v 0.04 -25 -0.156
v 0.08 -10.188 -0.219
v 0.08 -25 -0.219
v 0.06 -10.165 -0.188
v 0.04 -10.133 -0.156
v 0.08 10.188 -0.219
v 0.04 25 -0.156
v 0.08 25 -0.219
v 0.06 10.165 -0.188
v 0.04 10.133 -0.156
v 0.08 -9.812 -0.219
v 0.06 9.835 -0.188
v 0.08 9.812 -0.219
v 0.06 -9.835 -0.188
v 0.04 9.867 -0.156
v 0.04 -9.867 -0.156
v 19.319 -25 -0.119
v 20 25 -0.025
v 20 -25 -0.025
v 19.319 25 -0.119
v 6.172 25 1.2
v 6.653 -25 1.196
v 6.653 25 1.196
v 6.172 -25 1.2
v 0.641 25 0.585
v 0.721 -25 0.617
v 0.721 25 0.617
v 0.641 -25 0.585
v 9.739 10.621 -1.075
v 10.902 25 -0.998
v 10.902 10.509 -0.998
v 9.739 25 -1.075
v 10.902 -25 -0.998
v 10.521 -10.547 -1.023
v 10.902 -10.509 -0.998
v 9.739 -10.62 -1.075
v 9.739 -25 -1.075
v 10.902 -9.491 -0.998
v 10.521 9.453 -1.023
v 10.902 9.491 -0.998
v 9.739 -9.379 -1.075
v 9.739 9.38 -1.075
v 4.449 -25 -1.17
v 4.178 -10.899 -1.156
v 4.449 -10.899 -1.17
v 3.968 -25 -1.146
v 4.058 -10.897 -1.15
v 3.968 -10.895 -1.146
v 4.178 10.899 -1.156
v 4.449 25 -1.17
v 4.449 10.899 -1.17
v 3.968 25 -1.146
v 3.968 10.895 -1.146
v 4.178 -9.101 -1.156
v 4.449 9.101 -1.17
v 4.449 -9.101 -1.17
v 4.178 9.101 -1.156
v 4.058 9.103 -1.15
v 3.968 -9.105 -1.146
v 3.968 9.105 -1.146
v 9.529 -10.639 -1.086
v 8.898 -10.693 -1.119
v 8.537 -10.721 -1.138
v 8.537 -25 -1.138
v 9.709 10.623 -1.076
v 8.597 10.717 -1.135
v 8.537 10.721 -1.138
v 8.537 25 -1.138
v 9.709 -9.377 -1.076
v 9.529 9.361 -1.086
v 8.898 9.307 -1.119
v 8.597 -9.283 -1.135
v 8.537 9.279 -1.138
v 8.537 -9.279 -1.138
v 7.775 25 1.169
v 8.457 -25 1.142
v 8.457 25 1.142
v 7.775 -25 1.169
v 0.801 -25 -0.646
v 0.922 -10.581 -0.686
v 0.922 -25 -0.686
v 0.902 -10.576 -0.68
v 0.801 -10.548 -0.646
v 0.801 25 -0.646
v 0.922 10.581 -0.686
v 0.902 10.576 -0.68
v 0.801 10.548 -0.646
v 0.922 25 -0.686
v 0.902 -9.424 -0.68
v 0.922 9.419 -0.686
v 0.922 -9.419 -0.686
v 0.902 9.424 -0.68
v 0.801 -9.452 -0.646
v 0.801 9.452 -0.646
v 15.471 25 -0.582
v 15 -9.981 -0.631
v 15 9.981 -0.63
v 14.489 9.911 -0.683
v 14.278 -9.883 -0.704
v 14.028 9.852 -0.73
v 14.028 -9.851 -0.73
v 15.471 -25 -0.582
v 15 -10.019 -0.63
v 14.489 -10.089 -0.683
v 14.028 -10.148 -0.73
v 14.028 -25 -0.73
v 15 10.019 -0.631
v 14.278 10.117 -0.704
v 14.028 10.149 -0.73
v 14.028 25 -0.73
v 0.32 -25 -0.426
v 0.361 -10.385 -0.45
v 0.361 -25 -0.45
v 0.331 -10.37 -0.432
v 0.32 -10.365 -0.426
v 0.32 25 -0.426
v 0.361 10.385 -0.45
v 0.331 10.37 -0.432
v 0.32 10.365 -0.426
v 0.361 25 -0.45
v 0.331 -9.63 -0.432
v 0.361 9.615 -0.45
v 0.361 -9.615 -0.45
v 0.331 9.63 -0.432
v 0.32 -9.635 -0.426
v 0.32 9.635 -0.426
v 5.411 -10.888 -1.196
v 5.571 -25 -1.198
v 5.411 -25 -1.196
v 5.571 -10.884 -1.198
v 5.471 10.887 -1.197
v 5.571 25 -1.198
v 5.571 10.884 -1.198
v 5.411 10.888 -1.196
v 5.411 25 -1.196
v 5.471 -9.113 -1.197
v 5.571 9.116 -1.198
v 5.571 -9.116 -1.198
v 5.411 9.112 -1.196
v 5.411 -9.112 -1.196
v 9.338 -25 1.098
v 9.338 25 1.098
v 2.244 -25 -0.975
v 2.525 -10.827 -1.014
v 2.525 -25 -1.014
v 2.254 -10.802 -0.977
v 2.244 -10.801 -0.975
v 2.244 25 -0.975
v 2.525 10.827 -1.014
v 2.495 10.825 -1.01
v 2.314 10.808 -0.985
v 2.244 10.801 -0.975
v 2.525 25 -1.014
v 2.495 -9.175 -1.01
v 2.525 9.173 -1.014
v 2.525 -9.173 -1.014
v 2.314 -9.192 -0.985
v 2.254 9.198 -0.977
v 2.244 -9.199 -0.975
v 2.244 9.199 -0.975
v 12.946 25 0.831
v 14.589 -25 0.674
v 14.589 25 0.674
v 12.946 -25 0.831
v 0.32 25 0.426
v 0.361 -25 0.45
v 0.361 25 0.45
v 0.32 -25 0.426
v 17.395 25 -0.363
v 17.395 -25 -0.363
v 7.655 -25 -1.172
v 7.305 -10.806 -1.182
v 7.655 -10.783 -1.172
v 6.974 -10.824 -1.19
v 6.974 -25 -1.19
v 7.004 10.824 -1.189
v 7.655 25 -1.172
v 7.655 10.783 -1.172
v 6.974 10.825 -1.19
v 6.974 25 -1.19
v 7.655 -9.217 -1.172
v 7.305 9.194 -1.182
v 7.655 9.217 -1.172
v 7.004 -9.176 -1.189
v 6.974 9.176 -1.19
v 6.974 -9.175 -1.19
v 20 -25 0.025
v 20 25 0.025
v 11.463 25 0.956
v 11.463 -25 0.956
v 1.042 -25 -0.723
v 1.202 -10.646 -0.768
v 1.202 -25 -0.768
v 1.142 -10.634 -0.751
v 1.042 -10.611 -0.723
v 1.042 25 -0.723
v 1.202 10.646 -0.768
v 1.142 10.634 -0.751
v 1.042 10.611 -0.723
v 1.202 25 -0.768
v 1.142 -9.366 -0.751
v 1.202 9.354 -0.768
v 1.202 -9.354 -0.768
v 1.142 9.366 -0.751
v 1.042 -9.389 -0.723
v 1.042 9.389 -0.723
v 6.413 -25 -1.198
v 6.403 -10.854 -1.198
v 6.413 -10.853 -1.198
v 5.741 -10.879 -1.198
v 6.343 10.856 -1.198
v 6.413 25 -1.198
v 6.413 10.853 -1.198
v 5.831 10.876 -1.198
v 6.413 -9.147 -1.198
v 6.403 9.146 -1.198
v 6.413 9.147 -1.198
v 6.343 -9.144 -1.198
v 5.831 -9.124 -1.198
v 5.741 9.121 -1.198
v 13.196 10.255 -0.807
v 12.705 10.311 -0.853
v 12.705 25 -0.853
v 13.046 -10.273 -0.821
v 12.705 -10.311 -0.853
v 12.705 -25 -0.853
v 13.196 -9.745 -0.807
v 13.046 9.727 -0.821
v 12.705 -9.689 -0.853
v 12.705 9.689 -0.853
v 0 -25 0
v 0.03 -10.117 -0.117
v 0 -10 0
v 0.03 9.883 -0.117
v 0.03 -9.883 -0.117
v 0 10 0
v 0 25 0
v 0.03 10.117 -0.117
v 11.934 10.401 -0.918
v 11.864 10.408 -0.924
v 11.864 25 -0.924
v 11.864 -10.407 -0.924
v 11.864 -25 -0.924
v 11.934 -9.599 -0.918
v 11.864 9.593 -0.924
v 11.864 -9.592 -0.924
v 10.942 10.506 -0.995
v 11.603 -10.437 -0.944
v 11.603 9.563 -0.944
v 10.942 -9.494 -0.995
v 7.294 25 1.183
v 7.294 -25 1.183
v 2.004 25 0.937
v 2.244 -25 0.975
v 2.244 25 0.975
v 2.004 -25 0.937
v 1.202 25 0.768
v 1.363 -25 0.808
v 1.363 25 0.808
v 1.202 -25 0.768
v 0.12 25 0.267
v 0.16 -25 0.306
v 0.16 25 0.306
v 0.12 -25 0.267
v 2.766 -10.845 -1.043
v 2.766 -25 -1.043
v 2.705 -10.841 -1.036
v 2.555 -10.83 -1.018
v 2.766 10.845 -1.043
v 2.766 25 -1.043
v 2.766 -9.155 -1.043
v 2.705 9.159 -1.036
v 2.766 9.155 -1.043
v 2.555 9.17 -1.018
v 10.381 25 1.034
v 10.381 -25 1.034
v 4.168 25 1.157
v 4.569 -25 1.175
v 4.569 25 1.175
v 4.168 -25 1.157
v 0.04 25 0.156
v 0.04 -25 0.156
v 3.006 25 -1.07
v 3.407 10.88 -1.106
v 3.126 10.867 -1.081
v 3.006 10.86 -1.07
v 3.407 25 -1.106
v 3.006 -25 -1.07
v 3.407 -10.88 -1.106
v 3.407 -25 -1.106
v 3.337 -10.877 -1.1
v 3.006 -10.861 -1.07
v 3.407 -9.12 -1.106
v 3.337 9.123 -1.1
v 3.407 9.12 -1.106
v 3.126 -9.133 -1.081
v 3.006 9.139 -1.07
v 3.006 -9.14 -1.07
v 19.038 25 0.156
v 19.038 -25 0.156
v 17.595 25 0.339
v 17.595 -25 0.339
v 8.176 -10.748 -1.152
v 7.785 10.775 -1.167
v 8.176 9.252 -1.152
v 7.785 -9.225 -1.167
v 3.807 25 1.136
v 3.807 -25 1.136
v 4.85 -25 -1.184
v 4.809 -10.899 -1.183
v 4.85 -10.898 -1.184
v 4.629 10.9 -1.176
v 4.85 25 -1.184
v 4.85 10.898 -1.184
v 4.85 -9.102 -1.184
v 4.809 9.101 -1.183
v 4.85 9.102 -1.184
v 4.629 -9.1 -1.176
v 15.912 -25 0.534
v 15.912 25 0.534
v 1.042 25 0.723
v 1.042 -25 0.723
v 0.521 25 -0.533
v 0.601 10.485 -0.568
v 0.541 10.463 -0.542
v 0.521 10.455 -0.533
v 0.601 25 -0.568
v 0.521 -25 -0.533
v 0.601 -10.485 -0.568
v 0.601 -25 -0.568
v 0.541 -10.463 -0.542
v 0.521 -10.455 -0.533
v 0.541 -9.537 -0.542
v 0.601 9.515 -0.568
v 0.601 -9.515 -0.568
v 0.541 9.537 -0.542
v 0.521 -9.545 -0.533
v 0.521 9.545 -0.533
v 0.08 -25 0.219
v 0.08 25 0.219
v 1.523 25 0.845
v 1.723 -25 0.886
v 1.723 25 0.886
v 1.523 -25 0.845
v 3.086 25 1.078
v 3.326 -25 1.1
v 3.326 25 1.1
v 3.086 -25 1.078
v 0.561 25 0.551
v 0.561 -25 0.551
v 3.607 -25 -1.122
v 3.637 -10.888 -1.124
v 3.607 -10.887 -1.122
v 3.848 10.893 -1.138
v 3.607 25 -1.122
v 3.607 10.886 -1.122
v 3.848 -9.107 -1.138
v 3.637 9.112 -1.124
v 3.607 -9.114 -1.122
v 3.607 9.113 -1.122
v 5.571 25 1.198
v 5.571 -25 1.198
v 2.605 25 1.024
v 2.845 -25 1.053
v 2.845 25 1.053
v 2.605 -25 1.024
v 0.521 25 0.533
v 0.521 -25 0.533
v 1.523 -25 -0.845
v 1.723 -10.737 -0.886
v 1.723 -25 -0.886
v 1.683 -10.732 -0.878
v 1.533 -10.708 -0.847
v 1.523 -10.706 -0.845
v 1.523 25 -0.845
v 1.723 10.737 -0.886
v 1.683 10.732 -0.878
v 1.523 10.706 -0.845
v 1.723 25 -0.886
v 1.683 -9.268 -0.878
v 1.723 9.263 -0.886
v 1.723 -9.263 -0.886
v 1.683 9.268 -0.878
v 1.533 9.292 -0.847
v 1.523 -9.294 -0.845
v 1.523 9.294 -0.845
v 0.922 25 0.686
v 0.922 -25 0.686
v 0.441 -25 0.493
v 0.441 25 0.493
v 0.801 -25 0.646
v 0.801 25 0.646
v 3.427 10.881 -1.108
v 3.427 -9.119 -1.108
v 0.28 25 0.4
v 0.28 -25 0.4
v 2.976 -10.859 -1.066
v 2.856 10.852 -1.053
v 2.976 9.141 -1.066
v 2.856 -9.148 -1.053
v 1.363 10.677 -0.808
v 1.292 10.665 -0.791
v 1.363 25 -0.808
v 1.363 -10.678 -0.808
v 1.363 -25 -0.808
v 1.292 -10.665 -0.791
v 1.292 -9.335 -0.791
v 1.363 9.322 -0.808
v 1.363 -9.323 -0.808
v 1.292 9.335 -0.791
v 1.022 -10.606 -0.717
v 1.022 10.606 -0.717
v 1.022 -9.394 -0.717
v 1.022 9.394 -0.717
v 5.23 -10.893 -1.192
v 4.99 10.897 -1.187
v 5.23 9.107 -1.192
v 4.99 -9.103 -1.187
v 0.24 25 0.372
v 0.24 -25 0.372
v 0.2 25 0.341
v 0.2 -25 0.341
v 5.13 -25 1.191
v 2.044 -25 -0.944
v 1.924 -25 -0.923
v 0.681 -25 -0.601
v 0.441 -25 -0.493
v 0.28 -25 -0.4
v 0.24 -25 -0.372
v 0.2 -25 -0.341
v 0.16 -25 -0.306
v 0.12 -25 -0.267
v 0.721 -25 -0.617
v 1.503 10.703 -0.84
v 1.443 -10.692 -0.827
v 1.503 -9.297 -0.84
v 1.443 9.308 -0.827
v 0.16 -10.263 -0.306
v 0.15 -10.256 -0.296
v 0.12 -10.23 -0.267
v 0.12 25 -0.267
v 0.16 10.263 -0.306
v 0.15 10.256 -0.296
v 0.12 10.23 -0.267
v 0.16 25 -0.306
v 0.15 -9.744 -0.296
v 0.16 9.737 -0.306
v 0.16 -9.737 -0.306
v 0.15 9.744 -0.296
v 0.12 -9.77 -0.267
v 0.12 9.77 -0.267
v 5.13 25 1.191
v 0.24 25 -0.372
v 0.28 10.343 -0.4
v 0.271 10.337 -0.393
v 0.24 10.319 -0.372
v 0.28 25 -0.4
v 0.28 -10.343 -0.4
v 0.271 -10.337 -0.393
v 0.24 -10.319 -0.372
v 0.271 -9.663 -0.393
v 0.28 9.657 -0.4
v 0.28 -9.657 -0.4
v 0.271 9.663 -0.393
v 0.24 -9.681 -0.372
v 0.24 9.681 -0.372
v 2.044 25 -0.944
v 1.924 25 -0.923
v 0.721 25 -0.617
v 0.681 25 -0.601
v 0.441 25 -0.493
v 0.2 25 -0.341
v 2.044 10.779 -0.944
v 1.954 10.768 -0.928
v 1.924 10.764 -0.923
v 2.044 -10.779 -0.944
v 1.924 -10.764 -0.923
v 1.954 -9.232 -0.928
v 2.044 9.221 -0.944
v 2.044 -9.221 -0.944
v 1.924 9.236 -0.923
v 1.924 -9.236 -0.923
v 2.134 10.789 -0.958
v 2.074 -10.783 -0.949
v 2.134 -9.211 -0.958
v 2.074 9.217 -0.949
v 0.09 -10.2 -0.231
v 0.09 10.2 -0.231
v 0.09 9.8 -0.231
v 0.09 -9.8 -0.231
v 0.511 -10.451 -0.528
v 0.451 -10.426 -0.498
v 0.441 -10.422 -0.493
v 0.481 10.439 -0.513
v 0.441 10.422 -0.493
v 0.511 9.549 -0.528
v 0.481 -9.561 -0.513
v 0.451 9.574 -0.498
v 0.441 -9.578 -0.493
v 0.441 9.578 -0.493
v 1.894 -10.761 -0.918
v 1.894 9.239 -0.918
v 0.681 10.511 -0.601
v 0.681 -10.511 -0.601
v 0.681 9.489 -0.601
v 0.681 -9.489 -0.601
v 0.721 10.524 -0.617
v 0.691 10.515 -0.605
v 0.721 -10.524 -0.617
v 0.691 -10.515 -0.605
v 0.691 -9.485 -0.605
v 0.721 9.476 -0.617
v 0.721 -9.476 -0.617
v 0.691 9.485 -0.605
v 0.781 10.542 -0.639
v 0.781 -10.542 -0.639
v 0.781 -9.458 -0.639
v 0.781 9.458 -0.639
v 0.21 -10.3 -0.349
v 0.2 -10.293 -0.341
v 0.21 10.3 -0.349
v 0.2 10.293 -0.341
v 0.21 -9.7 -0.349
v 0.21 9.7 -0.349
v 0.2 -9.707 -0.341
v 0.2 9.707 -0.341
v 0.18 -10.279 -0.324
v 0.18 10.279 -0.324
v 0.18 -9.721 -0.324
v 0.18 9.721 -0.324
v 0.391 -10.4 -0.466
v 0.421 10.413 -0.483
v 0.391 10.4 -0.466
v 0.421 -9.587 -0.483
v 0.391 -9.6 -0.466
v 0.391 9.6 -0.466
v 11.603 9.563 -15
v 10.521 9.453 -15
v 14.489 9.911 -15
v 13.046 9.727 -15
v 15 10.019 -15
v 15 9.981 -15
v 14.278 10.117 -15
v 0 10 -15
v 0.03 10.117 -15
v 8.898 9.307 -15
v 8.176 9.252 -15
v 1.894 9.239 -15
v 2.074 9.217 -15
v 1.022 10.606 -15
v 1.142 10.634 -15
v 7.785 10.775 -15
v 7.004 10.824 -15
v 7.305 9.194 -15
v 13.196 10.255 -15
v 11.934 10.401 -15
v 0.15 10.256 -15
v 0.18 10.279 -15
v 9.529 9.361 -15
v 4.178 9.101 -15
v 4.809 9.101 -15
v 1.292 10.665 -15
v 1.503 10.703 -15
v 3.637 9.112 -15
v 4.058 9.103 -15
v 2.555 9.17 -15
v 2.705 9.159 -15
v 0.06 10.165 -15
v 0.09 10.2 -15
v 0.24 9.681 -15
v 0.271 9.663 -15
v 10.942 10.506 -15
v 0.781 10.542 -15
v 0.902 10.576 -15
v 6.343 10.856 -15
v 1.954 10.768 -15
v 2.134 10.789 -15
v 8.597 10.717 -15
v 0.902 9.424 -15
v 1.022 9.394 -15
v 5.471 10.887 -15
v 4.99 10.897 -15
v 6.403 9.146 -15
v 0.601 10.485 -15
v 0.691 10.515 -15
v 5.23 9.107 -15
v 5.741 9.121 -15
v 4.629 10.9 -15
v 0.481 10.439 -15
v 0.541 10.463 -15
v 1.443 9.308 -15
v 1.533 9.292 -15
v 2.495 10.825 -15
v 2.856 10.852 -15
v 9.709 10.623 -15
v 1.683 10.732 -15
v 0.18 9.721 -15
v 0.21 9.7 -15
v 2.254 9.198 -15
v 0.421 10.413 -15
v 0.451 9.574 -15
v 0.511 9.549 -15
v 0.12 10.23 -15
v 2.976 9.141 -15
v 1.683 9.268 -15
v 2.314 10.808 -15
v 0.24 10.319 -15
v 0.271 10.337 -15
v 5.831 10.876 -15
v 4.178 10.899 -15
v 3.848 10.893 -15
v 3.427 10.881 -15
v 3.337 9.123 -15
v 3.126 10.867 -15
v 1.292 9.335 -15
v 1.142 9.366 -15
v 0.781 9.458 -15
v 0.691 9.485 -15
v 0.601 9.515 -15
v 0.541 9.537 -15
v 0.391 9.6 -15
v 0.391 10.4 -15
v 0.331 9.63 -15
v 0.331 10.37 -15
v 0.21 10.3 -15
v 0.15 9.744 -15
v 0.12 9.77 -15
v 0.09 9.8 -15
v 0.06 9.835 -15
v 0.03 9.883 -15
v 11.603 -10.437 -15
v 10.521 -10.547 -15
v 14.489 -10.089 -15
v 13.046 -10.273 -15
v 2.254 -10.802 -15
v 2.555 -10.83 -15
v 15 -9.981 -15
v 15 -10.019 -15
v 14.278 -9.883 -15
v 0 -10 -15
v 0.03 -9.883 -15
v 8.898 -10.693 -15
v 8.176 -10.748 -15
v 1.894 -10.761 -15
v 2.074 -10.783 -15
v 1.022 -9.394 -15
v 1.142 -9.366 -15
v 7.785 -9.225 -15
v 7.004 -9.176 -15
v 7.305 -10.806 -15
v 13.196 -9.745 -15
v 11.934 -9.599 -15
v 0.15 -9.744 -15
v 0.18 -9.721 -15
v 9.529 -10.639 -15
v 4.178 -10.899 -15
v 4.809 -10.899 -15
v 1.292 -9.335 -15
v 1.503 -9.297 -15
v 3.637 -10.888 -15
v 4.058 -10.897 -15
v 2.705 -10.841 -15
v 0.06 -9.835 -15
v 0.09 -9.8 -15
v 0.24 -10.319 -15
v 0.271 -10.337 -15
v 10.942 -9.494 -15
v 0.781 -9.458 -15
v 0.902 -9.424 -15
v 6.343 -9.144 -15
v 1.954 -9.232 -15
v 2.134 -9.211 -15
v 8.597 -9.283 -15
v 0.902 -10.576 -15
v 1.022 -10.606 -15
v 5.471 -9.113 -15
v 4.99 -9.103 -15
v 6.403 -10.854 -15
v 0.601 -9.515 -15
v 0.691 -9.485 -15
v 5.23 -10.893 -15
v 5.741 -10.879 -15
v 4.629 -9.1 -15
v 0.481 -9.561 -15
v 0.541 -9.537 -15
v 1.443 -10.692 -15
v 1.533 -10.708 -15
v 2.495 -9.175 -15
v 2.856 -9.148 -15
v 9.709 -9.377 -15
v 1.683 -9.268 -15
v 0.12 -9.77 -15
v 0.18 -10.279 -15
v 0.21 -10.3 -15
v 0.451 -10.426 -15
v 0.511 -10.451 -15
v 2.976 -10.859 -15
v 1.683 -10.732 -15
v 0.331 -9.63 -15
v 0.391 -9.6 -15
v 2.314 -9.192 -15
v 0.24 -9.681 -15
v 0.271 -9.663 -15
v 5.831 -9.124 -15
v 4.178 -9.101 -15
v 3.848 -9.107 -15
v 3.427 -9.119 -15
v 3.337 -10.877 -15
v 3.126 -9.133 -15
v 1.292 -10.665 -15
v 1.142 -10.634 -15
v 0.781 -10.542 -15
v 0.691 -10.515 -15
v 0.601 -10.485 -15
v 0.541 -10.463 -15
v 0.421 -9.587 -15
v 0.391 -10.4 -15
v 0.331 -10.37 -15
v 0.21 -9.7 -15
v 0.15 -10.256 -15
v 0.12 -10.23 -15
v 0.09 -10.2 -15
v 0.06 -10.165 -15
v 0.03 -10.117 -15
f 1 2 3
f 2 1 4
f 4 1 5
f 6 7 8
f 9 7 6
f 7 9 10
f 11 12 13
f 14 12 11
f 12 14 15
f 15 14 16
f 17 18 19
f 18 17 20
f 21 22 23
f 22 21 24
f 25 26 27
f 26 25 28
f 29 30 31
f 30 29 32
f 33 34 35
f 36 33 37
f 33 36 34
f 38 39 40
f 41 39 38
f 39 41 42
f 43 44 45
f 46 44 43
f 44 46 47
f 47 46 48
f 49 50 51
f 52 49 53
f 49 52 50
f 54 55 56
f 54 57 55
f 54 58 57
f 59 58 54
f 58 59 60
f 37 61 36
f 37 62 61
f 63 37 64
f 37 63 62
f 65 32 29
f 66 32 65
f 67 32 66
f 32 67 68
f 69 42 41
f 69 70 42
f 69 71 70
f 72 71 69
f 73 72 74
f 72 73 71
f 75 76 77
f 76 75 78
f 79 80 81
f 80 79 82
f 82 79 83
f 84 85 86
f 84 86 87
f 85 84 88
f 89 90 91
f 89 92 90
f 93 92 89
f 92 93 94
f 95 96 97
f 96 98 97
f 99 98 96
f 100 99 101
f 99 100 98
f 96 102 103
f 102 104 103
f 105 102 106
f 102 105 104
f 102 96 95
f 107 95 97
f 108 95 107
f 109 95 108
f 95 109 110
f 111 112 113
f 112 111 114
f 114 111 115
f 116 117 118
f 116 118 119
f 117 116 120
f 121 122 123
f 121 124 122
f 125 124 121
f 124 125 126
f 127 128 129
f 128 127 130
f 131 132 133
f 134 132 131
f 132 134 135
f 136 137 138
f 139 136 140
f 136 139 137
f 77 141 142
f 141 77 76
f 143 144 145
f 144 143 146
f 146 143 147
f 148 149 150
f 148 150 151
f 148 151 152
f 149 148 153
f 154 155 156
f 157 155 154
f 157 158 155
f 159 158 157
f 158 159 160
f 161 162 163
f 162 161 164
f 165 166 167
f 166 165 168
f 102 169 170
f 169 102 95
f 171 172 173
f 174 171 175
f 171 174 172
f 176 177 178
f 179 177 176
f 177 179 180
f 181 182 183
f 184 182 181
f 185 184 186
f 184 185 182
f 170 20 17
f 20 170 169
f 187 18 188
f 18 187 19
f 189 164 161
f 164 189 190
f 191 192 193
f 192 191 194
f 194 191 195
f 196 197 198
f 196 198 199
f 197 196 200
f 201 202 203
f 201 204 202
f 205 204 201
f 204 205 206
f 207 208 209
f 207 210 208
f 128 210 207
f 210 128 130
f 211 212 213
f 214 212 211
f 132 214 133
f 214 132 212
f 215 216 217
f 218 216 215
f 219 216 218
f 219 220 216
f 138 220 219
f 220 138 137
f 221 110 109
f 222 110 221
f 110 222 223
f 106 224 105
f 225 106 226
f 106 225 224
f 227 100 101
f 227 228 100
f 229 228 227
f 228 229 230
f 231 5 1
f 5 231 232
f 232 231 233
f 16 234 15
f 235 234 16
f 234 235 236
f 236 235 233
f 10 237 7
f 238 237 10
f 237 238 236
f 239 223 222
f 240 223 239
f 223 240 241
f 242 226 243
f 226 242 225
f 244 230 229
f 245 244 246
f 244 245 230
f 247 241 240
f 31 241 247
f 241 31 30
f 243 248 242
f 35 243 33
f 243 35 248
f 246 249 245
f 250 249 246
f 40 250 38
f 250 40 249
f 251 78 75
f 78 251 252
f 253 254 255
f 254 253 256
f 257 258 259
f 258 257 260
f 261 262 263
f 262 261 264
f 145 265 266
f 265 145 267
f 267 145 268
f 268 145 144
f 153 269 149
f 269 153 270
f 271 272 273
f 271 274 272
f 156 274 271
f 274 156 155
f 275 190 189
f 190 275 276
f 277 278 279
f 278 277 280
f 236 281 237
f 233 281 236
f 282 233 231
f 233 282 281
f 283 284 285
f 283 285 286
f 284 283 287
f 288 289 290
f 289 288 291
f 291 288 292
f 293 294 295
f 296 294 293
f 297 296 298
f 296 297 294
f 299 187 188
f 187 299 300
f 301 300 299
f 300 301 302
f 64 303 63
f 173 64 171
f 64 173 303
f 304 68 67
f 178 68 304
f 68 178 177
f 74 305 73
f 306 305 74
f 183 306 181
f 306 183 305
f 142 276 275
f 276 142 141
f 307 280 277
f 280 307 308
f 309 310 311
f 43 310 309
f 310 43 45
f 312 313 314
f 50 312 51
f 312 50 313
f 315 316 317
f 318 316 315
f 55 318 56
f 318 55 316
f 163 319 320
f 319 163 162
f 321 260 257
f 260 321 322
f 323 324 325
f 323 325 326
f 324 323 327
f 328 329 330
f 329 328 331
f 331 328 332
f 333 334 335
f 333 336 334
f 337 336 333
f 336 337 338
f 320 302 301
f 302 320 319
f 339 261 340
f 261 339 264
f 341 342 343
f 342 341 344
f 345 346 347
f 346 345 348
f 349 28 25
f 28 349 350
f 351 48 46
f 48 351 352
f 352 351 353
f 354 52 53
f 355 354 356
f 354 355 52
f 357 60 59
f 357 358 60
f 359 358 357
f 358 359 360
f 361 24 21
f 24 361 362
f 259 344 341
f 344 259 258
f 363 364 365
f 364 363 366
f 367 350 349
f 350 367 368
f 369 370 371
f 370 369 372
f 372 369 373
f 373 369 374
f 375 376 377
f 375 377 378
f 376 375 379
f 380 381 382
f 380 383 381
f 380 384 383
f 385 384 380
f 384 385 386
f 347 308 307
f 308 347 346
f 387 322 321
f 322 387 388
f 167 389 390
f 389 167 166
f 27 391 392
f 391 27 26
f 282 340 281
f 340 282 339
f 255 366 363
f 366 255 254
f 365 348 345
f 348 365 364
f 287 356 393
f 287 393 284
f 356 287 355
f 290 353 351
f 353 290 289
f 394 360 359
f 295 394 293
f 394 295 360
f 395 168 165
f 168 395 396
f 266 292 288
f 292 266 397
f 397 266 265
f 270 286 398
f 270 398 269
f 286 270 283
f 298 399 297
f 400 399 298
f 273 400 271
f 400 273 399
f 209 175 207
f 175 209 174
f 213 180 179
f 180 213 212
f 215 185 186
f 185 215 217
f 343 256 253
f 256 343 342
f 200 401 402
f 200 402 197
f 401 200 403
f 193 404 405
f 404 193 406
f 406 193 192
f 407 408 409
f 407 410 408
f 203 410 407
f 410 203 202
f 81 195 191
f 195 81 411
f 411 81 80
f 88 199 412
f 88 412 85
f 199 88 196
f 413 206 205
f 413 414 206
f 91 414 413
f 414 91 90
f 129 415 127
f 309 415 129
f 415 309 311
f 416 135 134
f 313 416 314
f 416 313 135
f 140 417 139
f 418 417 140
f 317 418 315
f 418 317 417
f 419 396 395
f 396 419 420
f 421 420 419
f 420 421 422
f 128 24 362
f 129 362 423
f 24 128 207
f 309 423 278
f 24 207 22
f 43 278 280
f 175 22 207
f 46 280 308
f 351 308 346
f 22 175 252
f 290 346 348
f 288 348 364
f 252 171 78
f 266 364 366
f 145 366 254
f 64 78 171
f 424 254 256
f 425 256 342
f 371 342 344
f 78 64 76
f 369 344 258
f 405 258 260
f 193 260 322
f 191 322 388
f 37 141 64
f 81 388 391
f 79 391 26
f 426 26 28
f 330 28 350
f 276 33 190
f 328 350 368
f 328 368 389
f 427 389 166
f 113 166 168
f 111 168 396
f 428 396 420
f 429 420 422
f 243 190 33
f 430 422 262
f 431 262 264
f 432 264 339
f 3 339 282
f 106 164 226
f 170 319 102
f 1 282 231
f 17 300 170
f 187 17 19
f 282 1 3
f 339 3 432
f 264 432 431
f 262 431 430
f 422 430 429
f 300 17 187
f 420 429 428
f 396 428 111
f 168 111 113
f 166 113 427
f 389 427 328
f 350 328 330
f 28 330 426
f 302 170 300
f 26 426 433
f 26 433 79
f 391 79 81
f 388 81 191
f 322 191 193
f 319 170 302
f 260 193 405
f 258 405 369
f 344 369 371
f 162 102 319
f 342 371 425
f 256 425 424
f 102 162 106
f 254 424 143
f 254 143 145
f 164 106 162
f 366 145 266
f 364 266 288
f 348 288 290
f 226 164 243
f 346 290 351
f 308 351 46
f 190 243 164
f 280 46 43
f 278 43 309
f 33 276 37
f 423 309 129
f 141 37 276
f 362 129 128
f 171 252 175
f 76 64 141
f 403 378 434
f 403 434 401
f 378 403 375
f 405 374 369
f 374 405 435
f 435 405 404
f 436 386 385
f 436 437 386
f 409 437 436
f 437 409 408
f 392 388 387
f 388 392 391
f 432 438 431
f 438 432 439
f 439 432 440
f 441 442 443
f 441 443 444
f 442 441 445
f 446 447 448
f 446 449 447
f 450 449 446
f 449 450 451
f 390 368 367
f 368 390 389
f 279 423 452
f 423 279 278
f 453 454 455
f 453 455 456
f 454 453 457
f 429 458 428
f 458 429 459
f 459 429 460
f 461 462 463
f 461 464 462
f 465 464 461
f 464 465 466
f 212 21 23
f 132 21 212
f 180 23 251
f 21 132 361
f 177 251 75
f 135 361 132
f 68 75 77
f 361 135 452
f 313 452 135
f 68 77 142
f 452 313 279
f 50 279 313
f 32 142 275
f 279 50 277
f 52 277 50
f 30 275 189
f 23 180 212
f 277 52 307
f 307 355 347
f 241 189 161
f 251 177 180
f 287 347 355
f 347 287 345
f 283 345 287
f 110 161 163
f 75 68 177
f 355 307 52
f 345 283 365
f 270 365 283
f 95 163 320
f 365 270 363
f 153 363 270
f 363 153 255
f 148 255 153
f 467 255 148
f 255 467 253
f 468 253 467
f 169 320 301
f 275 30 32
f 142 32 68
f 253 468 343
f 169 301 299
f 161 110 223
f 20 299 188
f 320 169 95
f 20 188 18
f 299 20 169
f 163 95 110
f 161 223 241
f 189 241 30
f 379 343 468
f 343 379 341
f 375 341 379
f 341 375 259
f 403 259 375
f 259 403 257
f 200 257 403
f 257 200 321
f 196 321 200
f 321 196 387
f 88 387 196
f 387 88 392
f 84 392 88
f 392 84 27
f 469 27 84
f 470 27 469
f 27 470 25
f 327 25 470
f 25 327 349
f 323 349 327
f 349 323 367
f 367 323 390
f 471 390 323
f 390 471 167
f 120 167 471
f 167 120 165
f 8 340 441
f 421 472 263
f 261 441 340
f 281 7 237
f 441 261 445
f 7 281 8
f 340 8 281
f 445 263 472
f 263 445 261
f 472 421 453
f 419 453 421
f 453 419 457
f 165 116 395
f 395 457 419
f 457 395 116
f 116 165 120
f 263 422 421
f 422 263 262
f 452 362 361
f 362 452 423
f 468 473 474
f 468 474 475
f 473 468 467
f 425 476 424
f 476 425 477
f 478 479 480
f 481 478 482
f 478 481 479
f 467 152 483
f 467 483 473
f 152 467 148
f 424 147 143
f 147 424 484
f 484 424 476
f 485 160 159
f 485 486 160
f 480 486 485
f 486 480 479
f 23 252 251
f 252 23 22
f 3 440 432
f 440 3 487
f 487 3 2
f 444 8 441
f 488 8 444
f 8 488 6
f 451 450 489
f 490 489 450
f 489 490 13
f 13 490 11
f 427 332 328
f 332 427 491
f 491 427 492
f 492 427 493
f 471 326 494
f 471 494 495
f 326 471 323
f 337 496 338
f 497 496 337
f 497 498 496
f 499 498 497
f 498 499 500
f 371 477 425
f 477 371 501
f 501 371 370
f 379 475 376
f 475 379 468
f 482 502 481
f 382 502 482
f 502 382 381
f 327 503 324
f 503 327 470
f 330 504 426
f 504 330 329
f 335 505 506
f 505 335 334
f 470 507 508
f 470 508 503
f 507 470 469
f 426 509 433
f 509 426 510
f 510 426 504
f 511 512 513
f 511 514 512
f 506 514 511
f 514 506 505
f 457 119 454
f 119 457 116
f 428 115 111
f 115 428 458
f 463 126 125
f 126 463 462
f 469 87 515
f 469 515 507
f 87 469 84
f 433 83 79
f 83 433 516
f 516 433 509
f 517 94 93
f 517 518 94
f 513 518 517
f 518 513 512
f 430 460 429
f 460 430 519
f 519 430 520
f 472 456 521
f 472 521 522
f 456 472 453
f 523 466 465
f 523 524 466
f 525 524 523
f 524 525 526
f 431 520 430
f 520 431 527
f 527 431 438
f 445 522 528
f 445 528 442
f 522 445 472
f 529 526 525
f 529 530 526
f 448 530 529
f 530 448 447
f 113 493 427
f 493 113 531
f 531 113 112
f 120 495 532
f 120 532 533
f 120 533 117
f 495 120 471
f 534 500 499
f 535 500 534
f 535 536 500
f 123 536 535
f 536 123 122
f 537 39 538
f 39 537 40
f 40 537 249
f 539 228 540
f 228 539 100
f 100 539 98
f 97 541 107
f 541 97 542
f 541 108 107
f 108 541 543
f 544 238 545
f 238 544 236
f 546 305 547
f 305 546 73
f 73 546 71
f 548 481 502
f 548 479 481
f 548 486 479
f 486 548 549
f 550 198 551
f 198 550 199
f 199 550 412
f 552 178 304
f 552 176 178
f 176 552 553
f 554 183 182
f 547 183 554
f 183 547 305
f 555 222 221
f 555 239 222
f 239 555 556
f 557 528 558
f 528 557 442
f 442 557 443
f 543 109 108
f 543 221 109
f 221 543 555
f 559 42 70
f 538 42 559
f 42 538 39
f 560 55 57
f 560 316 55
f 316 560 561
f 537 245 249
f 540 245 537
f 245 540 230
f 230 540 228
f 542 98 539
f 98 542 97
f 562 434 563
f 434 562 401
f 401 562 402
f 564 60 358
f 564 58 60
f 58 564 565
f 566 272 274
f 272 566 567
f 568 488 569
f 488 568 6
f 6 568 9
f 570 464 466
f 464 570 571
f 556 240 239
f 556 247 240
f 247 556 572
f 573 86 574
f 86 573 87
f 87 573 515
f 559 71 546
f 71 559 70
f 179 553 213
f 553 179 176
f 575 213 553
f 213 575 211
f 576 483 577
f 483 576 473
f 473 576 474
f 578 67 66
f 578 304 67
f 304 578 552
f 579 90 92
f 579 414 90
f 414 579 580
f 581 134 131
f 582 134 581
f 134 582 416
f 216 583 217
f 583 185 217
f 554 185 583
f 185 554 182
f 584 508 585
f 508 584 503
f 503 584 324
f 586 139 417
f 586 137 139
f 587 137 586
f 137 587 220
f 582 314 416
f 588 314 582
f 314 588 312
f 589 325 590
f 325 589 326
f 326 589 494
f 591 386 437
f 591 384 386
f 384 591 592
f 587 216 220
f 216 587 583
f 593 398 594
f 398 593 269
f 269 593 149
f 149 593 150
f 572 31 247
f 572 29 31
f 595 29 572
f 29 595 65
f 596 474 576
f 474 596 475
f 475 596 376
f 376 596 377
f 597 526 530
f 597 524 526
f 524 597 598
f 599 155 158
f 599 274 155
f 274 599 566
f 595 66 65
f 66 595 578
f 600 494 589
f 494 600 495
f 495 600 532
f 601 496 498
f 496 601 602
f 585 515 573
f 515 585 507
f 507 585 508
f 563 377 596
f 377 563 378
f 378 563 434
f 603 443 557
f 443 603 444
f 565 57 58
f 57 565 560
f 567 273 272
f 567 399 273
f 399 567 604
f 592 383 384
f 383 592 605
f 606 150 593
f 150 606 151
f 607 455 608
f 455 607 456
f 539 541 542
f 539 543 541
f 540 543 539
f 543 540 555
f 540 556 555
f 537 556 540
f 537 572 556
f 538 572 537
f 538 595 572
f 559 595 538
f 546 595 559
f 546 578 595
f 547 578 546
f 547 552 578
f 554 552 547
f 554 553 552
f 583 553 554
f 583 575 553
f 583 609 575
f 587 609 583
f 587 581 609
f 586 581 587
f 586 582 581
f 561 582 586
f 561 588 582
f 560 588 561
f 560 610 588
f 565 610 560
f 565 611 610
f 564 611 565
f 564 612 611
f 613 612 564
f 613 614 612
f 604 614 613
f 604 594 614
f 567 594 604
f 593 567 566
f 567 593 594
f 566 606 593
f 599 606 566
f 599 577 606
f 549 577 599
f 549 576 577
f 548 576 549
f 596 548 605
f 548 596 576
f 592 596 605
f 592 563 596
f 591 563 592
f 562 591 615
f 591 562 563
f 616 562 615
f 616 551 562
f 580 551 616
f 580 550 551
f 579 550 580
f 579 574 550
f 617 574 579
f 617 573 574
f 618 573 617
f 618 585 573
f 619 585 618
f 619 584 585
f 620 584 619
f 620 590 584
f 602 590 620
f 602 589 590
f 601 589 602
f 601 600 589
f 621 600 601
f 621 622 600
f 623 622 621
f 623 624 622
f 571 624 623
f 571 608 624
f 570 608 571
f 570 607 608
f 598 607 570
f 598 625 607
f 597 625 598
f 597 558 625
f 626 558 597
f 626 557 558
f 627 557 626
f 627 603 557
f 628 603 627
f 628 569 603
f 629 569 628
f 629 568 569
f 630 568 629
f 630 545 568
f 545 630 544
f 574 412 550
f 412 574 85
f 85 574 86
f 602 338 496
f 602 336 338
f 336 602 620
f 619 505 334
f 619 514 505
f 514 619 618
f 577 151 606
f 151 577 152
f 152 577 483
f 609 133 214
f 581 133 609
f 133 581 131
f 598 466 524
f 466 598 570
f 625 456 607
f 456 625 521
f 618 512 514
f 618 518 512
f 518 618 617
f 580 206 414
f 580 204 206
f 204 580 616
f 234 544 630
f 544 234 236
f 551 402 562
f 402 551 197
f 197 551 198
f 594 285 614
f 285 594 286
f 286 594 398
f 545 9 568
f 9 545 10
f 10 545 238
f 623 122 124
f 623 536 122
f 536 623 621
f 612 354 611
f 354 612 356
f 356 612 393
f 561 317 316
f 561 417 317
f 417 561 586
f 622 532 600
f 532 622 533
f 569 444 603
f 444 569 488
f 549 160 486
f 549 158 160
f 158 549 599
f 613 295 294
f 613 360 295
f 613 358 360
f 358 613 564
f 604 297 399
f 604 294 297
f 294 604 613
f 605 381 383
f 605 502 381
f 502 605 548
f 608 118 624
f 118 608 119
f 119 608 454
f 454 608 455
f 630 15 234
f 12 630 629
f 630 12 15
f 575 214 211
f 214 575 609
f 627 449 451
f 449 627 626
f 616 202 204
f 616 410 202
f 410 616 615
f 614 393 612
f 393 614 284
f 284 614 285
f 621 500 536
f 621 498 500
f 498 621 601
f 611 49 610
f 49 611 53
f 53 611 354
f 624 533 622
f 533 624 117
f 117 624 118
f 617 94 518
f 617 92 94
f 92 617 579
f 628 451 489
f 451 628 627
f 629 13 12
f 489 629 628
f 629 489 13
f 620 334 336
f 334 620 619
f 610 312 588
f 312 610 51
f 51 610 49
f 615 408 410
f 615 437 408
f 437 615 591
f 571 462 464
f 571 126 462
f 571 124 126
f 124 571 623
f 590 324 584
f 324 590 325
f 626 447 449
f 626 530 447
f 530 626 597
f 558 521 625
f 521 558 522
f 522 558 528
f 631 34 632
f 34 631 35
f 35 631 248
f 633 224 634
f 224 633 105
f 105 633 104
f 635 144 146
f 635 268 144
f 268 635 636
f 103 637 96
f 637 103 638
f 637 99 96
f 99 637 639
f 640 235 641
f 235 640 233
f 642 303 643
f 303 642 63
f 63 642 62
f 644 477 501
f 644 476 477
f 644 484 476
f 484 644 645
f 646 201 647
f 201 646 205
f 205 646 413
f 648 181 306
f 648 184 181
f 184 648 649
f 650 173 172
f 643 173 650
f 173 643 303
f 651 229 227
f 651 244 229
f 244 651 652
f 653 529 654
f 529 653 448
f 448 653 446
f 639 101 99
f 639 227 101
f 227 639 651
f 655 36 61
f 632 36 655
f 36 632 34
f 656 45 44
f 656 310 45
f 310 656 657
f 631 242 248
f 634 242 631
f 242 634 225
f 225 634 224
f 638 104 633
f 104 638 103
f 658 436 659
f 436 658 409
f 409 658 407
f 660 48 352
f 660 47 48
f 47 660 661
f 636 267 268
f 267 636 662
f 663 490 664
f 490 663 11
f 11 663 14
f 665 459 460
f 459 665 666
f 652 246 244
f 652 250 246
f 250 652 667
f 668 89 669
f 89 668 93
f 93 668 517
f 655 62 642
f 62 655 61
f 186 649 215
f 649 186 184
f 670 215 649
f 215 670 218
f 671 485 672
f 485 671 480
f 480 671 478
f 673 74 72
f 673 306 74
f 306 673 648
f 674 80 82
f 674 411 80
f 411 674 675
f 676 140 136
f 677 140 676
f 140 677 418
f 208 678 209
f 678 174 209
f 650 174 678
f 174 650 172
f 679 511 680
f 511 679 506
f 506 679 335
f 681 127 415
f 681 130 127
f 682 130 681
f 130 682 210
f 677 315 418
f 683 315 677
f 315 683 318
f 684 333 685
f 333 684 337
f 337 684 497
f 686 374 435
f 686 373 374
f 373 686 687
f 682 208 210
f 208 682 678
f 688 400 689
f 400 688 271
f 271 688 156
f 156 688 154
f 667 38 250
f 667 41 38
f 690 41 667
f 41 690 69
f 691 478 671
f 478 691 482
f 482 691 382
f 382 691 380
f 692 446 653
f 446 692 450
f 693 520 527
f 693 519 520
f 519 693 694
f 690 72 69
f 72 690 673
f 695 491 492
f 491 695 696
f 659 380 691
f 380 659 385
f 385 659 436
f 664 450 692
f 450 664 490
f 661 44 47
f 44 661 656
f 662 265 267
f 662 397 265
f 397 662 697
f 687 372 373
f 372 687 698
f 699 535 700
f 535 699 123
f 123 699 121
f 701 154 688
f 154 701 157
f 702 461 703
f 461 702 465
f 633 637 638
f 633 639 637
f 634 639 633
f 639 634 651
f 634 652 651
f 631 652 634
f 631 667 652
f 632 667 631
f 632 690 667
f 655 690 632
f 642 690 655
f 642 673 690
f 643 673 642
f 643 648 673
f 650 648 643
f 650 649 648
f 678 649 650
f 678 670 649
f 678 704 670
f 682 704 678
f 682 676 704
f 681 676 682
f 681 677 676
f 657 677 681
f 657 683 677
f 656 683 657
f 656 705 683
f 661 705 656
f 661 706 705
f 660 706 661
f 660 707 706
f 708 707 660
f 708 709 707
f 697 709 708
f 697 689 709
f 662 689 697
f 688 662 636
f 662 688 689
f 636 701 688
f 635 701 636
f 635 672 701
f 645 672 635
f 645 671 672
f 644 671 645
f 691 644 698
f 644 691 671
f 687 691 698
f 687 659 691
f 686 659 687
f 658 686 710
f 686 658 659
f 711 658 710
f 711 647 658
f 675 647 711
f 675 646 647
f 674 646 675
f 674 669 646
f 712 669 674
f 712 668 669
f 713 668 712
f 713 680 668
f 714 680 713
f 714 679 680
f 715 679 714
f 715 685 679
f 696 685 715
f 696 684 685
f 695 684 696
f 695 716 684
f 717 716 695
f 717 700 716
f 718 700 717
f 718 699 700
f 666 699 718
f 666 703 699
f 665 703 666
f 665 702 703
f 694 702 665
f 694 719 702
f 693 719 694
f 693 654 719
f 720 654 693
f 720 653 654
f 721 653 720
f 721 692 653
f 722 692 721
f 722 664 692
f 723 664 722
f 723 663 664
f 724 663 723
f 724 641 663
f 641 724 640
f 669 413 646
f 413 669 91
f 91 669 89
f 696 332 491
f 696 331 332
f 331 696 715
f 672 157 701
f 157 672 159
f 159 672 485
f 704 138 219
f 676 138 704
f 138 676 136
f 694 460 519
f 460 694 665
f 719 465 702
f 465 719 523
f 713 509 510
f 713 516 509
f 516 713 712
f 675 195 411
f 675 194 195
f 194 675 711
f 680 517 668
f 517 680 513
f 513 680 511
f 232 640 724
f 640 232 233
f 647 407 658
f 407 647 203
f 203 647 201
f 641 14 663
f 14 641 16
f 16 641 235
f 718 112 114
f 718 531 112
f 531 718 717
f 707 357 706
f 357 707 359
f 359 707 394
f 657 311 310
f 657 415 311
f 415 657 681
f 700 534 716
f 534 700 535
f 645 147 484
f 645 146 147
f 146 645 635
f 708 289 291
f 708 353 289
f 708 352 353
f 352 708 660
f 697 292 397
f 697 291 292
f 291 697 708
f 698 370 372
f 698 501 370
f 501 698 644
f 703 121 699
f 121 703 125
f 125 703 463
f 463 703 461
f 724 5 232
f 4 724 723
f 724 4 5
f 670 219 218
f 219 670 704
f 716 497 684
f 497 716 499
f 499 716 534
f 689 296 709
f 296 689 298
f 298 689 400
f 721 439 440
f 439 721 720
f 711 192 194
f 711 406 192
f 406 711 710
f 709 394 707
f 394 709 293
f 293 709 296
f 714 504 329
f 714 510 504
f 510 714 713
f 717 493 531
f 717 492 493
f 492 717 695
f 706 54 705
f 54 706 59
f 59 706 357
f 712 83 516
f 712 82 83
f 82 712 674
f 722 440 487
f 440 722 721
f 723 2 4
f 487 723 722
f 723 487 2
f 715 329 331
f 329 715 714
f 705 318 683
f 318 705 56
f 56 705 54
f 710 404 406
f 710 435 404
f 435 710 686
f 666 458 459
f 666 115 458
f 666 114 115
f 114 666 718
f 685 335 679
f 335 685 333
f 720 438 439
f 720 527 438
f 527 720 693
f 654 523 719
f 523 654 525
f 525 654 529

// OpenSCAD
// spoiler_wing

module naca_airfoil(chord=20, t=0.12, n=300) {

function naca_half_thickness(x,t) =5 * t * (0.2969*sqrt(x) - 0.1260*x - 0.3516 * pow(x,2) + 0.2843*pow(x,3) - 0.1015*pow(x,4));

function naca_top_coordinates(t,n) = [for (x=[0:1/(n-1):1]) [x, naca_half_thickness(x,t)]];
    
function naca_bottom_coordinates(t,n) = [ for (x=[1:-1/(n-1):0]) [x, -naca_half_thickness(x,t)]];
    
function naca_coordinates(t,n) = concat(naca_top_coordinates(t,n), naca_bottom_coordinates(t,n));

points = naca_coordinates(t=t,n=n);
scale([chord,chord,1])
    polygon(points);
}

//naca_airfoil(t=0.4,n=500, chord=15);

module naca_wing(span, chord, t, n, center=false) {
    linear_extrude(height=span, center=center)
        naca_airfoil(chord,t,n);
    }
    
rotate([90,0,0])
    naca_wing(span=50, chord=20, t=0.12, n= 500, center=true);
    
translate([0,10,-15])
    naca_wing(span=15, chord=15, t=0.12, n= 500);
    
translate([0,-10,-15])
    naca_wing(span=15, chord=15, t=0.12, n= 500);
